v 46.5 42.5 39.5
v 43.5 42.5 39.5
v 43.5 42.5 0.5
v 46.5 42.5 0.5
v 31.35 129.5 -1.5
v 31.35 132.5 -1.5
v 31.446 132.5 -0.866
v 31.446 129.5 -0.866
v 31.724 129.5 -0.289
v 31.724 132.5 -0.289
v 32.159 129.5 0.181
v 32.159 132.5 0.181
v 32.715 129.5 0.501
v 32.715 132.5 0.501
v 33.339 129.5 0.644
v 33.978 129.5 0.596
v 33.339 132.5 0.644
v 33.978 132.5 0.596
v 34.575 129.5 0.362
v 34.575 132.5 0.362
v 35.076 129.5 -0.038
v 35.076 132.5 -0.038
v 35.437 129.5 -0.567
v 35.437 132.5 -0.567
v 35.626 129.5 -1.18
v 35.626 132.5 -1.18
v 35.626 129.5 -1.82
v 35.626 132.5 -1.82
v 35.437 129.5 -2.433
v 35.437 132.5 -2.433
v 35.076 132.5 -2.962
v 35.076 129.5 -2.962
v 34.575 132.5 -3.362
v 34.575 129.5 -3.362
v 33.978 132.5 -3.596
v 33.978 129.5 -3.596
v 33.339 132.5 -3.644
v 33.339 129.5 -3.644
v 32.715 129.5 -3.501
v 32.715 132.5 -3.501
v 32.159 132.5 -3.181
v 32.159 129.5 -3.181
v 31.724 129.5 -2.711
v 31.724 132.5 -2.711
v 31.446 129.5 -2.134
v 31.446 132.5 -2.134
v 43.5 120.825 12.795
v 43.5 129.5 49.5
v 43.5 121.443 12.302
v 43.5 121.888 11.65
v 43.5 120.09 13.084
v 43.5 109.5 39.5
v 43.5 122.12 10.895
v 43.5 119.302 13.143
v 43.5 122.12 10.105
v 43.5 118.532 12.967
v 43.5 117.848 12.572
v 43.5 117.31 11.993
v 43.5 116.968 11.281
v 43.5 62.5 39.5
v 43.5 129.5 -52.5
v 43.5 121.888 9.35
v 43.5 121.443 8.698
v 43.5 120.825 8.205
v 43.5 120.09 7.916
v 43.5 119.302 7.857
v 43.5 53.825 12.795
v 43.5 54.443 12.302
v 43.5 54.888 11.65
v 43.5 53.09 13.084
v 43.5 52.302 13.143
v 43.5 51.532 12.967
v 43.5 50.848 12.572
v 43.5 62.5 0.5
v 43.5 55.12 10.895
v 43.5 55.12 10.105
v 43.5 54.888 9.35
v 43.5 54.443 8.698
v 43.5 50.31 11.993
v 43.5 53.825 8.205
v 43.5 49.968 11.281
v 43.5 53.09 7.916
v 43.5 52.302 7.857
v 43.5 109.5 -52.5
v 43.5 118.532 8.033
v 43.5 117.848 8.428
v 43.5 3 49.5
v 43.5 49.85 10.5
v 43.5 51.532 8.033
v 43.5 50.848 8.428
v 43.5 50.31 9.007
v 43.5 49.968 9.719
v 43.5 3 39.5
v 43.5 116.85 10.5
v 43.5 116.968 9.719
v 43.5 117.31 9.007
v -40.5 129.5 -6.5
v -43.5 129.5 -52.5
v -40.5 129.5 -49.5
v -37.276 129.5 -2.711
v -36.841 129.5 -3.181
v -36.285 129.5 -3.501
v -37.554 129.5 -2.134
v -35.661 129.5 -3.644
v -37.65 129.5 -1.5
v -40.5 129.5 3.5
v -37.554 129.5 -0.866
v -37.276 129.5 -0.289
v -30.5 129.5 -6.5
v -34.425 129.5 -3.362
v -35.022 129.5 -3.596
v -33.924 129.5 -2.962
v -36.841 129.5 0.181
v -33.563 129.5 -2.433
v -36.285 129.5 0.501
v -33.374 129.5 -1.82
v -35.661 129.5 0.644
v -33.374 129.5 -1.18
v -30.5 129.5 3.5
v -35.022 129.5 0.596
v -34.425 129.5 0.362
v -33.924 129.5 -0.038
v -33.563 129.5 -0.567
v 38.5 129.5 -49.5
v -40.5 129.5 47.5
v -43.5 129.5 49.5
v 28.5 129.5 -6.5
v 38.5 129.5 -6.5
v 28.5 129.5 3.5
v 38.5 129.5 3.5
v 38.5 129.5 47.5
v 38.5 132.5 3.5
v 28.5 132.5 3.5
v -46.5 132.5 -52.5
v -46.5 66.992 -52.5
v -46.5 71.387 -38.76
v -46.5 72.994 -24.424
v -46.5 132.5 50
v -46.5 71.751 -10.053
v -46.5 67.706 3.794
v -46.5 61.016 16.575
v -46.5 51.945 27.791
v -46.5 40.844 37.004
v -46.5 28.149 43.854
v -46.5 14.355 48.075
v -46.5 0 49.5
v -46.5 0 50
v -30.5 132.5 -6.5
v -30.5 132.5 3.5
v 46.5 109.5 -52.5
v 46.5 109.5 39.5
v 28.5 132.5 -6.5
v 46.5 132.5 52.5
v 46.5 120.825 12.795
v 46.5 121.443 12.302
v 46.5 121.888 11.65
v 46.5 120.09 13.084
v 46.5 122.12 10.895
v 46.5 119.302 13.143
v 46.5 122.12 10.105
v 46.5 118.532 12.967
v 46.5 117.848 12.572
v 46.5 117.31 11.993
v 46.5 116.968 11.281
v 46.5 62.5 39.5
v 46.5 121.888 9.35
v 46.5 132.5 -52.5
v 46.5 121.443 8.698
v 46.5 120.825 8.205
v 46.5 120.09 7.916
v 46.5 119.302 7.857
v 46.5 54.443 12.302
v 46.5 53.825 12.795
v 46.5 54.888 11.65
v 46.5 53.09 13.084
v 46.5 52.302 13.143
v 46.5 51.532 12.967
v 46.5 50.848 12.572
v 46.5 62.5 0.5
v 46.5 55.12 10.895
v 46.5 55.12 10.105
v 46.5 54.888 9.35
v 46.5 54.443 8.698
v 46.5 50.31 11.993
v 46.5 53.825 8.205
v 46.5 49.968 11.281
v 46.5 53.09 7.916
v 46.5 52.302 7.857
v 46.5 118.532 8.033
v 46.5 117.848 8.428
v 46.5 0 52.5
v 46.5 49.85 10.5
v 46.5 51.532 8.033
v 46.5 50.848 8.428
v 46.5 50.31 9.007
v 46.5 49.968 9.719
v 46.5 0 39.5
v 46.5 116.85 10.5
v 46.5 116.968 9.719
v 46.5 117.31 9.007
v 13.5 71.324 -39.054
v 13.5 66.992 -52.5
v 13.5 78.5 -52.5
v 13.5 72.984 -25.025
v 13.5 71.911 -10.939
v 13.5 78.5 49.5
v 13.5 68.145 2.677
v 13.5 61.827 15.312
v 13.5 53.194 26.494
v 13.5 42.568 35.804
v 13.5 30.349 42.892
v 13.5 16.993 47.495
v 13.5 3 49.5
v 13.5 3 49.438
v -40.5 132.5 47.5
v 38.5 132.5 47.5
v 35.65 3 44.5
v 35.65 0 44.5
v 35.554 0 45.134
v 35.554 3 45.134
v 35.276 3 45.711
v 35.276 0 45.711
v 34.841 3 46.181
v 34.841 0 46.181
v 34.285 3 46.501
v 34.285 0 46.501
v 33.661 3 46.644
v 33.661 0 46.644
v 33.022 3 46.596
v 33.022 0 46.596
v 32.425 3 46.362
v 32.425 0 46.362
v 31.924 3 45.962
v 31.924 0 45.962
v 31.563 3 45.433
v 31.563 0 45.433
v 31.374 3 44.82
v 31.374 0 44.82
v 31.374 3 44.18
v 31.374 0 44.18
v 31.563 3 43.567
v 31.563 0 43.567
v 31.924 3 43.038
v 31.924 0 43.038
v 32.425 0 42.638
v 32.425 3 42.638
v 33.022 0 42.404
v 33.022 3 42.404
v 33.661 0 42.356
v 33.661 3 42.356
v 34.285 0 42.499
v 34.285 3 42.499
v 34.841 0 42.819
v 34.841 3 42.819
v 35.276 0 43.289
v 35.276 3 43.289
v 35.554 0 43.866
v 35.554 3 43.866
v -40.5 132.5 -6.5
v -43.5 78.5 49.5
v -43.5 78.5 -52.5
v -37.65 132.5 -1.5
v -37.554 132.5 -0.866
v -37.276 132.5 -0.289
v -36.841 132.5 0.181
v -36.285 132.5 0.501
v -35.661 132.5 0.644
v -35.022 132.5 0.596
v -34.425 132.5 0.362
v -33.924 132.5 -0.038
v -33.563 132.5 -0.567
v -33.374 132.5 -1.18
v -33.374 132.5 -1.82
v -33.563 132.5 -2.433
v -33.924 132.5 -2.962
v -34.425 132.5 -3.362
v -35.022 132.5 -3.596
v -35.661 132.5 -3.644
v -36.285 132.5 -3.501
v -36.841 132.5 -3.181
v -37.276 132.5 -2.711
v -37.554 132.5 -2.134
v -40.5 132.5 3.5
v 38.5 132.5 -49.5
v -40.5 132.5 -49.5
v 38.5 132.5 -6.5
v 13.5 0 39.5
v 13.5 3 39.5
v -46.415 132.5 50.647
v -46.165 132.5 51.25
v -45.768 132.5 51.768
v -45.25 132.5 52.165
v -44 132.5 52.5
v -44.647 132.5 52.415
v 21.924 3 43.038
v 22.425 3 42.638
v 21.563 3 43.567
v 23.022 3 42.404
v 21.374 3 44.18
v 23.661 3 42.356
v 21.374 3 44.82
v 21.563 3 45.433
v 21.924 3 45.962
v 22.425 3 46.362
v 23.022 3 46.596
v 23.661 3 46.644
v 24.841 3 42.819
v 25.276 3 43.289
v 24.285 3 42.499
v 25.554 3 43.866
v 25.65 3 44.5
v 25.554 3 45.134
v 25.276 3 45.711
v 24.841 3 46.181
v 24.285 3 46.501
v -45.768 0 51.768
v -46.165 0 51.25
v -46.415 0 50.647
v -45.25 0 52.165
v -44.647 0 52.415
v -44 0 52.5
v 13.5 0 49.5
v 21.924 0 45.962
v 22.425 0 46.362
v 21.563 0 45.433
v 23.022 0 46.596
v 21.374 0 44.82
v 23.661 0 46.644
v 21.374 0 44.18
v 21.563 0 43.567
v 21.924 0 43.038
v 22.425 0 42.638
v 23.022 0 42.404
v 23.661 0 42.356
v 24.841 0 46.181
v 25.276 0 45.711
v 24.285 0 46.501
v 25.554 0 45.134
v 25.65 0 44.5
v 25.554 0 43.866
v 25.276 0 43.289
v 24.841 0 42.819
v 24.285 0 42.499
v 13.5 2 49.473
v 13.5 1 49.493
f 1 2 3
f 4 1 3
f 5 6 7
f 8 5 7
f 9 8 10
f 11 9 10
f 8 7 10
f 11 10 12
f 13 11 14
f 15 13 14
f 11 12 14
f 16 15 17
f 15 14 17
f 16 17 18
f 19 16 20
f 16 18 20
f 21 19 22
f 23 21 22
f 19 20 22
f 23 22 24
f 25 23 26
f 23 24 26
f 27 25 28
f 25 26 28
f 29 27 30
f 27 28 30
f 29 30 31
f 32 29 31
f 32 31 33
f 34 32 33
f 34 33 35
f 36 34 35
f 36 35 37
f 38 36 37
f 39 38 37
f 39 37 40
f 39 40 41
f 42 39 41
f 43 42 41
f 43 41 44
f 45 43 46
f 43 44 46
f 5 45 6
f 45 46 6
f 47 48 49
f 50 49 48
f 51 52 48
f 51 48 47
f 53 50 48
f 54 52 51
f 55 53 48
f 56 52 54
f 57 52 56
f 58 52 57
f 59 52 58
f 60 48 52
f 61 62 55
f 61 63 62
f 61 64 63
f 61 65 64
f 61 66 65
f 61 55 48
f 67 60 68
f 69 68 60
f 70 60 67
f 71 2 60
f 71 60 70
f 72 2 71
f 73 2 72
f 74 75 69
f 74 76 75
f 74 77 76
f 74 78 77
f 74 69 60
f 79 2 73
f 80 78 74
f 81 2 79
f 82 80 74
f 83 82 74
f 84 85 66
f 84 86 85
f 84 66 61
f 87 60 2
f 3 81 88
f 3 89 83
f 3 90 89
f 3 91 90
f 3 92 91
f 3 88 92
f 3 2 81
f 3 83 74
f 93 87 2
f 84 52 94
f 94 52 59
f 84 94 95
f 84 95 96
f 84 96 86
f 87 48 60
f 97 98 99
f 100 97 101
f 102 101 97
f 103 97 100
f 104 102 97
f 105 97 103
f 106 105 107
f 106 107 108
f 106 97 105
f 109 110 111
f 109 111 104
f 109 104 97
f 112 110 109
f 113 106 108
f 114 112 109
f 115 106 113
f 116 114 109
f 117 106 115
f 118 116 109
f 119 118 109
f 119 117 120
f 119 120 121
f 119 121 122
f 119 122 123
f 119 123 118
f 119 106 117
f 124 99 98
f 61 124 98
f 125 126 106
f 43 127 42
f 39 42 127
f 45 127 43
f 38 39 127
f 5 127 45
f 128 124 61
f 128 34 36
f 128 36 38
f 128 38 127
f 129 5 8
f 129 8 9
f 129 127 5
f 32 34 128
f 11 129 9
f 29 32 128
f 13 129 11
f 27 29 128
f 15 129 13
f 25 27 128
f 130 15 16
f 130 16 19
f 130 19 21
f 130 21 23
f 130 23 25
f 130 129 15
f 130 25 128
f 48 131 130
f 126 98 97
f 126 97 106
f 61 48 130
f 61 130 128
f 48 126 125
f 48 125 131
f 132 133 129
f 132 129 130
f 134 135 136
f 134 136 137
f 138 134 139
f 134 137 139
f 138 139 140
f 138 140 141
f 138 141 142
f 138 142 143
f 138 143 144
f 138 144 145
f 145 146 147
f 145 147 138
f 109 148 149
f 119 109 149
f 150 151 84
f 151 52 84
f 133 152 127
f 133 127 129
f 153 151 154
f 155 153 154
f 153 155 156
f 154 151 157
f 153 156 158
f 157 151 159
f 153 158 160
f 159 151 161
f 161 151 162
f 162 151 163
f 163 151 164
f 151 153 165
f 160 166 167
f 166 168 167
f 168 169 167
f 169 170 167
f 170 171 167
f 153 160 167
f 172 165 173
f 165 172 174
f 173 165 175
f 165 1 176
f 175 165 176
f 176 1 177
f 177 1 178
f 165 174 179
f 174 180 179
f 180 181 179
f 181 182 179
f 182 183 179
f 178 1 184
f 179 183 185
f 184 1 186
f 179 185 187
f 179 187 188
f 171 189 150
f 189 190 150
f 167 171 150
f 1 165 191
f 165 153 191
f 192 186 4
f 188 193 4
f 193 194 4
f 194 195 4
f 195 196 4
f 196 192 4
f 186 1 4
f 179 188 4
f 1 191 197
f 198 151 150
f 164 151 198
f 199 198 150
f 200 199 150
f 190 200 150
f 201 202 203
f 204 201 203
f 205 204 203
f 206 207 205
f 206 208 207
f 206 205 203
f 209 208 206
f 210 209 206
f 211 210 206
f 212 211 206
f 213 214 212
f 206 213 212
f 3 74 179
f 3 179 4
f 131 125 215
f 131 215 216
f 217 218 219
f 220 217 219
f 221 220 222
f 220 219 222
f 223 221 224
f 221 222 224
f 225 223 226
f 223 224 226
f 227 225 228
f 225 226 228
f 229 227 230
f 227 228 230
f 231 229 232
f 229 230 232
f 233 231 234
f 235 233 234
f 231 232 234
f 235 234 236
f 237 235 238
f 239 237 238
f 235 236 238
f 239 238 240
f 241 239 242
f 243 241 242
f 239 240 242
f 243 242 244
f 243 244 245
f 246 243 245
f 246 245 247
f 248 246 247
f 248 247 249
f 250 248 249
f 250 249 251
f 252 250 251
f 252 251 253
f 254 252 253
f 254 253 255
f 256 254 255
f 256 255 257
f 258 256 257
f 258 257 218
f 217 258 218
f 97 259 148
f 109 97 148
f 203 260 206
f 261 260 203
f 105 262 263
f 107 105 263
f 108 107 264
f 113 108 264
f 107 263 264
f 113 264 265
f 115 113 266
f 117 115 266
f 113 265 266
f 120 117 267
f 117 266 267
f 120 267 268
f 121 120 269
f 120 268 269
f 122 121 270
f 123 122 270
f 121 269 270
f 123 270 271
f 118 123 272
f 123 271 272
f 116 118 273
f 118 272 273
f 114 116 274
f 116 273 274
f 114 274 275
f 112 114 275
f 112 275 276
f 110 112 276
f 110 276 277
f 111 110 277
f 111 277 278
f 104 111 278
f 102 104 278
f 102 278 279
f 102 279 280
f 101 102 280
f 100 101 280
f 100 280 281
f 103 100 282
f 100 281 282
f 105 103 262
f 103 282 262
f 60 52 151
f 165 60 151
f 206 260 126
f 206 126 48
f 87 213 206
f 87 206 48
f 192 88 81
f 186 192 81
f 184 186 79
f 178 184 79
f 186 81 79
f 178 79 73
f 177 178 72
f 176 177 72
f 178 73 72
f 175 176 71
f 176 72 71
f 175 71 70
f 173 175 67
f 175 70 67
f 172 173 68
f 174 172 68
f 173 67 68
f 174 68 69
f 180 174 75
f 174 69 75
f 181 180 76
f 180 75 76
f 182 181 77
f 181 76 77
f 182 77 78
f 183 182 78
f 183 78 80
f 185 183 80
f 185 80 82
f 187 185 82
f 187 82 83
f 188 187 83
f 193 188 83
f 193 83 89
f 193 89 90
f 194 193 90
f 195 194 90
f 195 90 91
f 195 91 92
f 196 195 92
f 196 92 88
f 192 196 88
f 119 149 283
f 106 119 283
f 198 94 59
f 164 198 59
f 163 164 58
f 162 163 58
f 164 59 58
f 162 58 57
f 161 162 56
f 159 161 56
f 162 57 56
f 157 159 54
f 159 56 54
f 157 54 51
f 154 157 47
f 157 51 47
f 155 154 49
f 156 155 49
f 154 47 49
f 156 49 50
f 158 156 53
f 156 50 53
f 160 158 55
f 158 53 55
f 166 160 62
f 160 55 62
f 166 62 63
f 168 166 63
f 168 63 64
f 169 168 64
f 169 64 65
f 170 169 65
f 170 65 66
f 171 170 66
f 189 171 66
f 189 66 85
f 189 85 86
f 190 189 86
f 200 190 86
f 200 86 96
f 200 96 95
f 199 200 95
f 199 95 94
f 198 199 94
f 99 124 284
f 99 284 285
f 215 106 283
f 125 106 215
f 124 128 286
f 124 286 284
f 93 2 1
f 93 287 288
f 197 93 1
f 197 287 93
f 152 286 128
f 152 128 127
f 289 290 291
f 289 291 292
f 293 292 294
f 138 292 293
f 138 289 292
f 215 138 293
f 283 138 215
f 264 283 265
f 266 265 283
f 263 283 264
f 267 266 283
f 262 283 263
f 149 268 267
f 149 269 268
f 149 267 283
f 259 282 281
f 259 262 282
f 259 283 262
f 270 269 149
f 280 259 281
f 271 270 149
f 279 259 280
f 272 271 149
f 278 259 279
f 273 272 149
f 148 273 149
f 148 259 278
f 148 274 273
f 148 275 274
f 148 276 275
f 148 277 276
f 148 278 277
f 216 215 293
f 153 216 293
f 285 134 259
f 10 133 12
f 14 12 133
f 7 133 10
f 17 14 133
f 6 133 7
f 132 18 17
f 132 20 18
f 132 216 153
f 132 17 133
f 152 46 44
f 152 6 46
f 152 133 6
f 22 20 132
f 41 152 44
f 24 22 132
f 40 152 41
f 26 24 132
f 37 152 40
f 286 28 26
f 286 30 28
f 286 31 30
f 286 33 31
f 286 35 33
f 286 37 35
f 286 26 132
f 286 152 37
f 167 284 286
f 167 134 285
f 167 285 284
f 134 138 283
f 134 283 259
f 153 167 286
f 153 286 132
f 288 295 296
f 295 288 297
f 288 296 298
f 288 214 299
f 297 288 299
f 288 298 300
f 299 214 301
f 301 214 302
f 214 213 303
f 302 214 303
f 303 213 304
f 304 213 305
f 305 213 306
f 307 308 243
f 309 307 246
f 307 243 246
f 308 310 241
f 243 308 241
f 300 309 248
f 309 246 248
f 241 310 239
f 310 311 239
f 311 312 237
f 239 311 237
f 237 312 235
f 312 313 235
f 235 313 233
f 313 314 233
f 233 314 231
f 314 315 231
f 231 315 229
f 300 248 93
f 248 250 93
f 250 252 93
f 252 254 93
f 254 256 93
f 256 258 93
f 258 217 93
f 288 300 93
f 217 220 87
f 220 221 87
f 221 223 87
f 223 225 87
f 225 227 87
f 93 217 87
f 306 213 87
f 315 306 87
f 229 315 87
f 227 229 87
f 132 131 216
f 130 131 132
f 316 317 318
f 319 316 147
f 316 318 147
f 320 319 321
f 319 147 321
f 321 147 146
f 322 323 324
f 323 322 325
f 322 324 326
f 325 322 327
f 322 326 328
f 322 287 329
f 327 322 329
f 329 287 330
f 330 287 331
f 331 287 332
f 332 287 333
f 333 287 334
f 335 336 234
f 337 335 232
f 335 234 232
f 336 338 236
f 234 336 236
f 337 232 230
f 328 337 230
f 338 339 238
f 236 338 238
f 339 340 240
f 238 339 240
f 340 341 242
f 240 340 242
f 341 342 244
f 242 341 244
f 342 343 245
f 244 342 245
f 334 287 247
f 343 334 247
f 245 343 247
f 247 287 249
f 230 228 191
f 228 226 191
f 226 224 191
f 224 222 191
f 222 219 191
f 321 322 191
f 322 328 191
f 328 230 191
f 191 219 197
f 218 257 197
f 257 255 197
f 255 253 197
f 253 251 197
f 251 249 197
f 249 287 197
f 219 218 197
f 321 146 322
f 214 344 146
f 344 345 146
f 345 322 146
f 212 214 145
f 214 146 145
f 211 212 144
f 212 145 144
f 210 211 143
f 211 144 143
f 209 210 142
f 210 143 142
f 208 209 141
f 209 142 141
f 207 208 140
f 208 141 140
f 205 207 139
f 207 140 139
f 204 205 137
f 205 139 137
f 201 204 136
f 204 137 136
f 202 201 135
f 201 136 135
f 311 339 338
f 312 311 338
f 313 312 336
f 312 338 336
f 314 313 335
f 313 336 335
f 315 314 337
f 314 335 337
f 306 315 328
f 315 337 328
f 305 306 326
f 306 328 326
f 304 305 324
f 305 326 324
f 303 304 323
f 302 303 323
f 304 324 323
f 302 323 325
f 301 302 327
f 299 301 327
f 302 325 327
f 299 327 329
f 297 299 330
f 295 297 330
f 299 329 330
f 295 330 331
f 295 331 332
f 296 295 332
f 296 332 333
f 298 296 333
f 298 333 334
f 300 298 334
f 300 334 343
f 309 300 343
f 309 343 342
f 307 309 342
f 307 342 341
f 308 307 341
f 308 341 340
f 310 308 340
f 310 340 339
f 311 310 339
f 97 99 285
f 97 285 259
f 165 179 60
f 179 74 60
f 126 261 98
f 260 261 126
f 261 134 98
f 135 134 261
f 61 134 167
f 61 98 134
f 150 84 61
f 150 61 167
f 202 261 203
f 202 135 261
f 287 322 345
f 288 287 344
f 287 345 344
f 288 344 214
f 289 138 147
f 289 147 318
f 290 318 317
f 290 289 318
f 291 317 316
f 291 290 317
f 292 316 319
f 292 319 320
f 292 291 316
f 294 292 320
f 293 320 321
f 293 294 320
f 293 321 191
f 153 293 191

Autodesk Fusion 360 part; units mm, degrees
sketch "스케치1" plane through (0, 0, 0) normal (0, 1, 0) x (1, 0, 0)
  line L0 (-46.5, -52.5) -> (46.5, -52.5)
  line L1 (46.5, -52.5) -> (46.5, 52.5)
  line L2 (46.5, 52.5) -> (-46.5, 52.5)
  line L3 (-46.5, 52.5) -> (-46.5, -52.5)
  line L4 (-46.5, -52.5) -> (46.5, 52.5) construction
  line L5 (46.5, -52.5) -> (-46.5, 52.5) construction
  line L6 (0, -52.5) -> (0, -47.5)
  line L7 (0, 52.5) -> (0, 49.5)
  line L8 (46.5, 0) -> (38.5, 0)
  line L9 (-46.5, 0) -> (-40.5, 0)
  line L10 (-40.5, 0) -> (-40.5, -47.5)
  line L11 (-40.5, -47.5) -> (38.5, -47.5)
  line L12 (38.5, -47.5) -> (38.5, 49.5)
  line L13 (38.5, 49.5) -> (-40.5, 49.5)
  line L14 (-40.5, 49.5) -> (-40.5, 0)
  dimension "d1" = 105
  dimension "d2" = 93
  dimension "d3" = 5
  dimension "d4" = 3
  dimension "d5" = 8
  dimension "d6" = 6
extrude "돌출1" add sketch "스케치1" along normal blind 132.5 contours L0 L3 L6 L9 L10 L11 | L0 L1 L6 L8 L11 L12 | L2 L3 L7 L9 L13 L14 | L1 L2 L7 L8 L12 L13
sketch "스케치2" plane through (0, 0, 0) normal (0, -1, 0) x (1, 0, 0)
  line L0 (-40.5, -49.5) -> (-40.5, 47.5)
  line L1 (-40.5, 47.5) -> (38.5, 47.5)
  line L2 (38.5, 47.5) -> (38.5, -49.5)
  line L3 (38.5, -49.5) -> (-40.5, -49.5)
  line L4 (-46.5, 52.5) -> (-46.5, -52.5)
  line L5 (-46.5, -52.5) -> (46.5, -52.5)
  line L6 (46.5, -52.5) -> (46.5, 52.5)
  line L7 (46.5, 52.5) -> (-46.5, 52.5)
  line L8 (-46.5, 52.5) -> (-43.5, 52.5)
  line L9 (-43.5, 52.5) -> (-43.5, 49.5)
  line L10 (-43.5, 49.5) -> (-46.5, 49.5)
  line L11 (-46.5, 49.5) -> (-46.5, 52.5)
  line L12 (46.5, -52.5) -> (43.5, -52.5)
  line L13 (-43.5, 49.5) -> (43.5, 49.5)
  line L14 (43.5, 49.5) -> (43.5, -52.5)
  line L15 (43.5, -52.5) -> (-43.5, -52.5)
  line L16 (-43.5, -52.5) -> (-43.5, 49.5)
  dimension "d9" = 3
  dimension "d10" = 3
  dimension "d11" = 3
extrude "돌출2" cut sketch "스케치2" against normal blind 129.5 contours L5 L13 L14 L15 L16
sketch "스케치3" plane through (-46.5, 0, 0) normal (-1, 0, 0) x (0, -1, 0)
  line L0 (0, -52.5) -> (0, 52.5)
  line L1 (0, 52.5) -> (-132.5, 52.5)
  line L2 (-132.5, 52.5) -> (-132.5, -52.5)
  line L3 (-132.5, -52.5) -> (0, -52.5)
  line L4 (0, 52.5) -> (0, -23.5)
  circle A0 centre (0, -23.5) radius 73
  circle A1 centre (0, -23.5) radius 75.5
  line L5 (0, 52.5) -> (-42.5, 52.5)
  line L6 (-42.5, 52.5) -> (-42.5, 35.8528)
  line L7 (-42.5, 35.8528) -> (0, 35.8528)
  line L8 (0, 35.8528) -> (0, 52.5)
  line L9 (0, 52.5) -> (-3, 52.5)
  line L10 (-3, 52.5) -> (-3, 49.4383)
  line L11 (-3, 49.4383) -> (0, 49.4383)
  line L12 (0, 49.4383) -> (0, 52.5)
  line L13 (-66.9925, -52.5) -> (-62.9352, -52.5)
  line L14 (-62.9352, -52.5) -> (-62.9352, -49.5)
  line L15 (-62.9352, -49.5) -> (-66.9925, -49.5)
  line L16 (-66.9925, -49.5) -> (-66.9925, -52.5)
  line L17 (0, 52.5) -> (-75.5, 52.5)
  line L18 (-75.5, 52.5) -> (-75.5, -52.5)
  line L19 (-75.5, -52.5) -> (0, -52.5)
  line L20 (0, -52.5) -> (0, 52.5)
  dimension "d14" = 76
  dimension "d15" = 146
  dimension "d16" = 151
  dimension "d45" = 42.5
  dimension "d46" = 3
  dimension "d50" = 3
  dimension "d71" = 75.5
extrude "돌출3" cut sketch "스케치3" against normal blind 10 contours L0 L3 L4 A0 L7 L14 L15 L16 L19 L20 | L3 L13 L14 L15 L16 L19 | L0 L4 A0 L7 L8 L11 L20 | L0 L4 A0 L8 L11 L12 L20
sketch "스케치4" plane through (0, 132.5, 0) normal (0, 1, 0) x (-1, 0, 0)
  line L0 (40.5, 47.5) -> (40.5, -49.5)
  line L1 (40.5, -49.5) -> (-38.5, -49.5)
  line L2 (-38.5, -49.5) -> (-38.5, 47.5)
  line L3 (-38.5, 47.5) -> (40.5, 47.5)
  line L4 (46.5, -52.5) -> (46.5, 52.5)
  line L5 (46.5, 52.5) -> (-46.5, 52.5)
  line L6 (-46.5, 52.5) -> (-46.5, -52.5)
  line L7 (-46.5, -52.5) -> (46.5, -52.5)
  line L8 (-38.5, -49.5) -> (-38.5, -6.5)
  line L9 (-38.5, -6.5) -> (-28.5, -6.5)
  line L10 (-28.5, -6.5) -> (-28.5, 3.5)
  line L11 (-28.5, 3.5) -> (-38.5, 3.5)
  line L12 (-38.5, 3.5) -> (-38.5, -6.5)
  line L13 (40.5, -6.5) -> (30.5, -6.5)
  line L14 (30.5, -6.5) -> (30.5, 3.5)
  line L15 (30.5, 3.5) -> (40.5, 3.5)
  line L16 (40.5, 3.5) -> (40.5, -6.5)
  circle A0 centre (-33.5, -1.5) radius 2.15
  circle A1 centre (35.5, -1.5) radius 2.15
  dimension "d19" = 43
  dimension "d20" = 10
  dimension "d21" = 10
  dimension "d22" = 10
  dimension "d23" = 10
  dimension "d24" = 4.3
  dimension "d25" = 4.3
extrude "돌출4" add sketch "스케치4" against normal blind 3 contours L0 L13 L14 L15 L16 | L2 L9 L10 L11 L12
sketch "스케치5" plane through (43.5, 0, 0) normal (-1, 0, 0) x (0, -1, 0)
  line L0 (0, -52.5) -> (0, 49.5)
  line L1 (0, 49.5) -> (-129.5, 49.5)
  line L2 (-129.5, 49.5) -> (-129.5, -52.5)
  line L3 (-129.5, -52.5) -> (0, -52.5)
  line L4 (-129.5, 49.5) -> (-109.5, 49.5)
  line L5 (-109.5, 49.5) -> (-109.5, -52.5)
  line L6 (-109.5, -52.5) -> (-129.5, -52.5)
  line L7 (-129.5, -52.5) -> (-129.5, 49.5)
  line L8 (-109.5, 49.5) -> (-62.5, 49.5)
  line L9 (-62.5, 49.5) -> (-42.5, 49.5)
  line L10 (-42.5, 49.5) -> (-42.5, -52.5)
  line L11 (-42.5, -52.5) -> (-62.5, -52.5)
  line L12 (-62.5, -52.5) -> (-62.5, 49.5)
  line L13 (-42.5, 49.5) -> (-42.5, 20.5)
  line L14 (-109.5, 20.5) -> (-129.5, 20.5)
  line L15 (-129.5, 20.5) -> (-129.5, 0.5)
  line L16 (-129.5, 0.5) -> (-109.5, 0.5)
  line L17 (-109.5, 0.5) -> (-109.5, 20.5)
  circle A0 centre (-119.5, 10.5) radius 2.65
  line L18 (-42.5, 20.5) -> (-62.5, 20.5)
  line L19 (-62.5, 20.5) -> (-62.5, 0.5)
  line L20 (-62.5, 0.5) -> (-42.5, 0.5)
  line L21 (-42.5, 0.5) -> (-42.5, 20.5)
  circle A1 centre (-52.5, 10.5) radius 2.65
  dimension "d28" = 20
  dimension "d29" = 47
  dimension "d30" = 20
  dimension "d31" = 29
  dimension "d33" = 20
  dimension "d34" = 20
  dimension "d36" = 5.3
  dimension "d41" = 20
  dimension "d42" = 5.3
extrude "돌출5" cut sketch "스케치5" against normal blind 3 contours L0 L1 L3 L10 L13 L21 | L3 L10 L11 L12 L20 | L1 L3 L5 L8 L12 L17 L19 | A0 | A1
extrude "돌출19" add sketch "스케치3" against normal blind 60 contours L3 A0 A1 L6 L19 | A0 A1 L6 L10 | L3 A1 L18 L19 | L0 L4 A0 A1 L8 L10 L12 L20 | L1 A1 L5 L6 L10 L17 | L1 A1 L6 L17 L18 | L0 L1 L4 A1 L5 L8 L9 L10 L12 L17 L20
extrude "돌출21" add 1 faces at (-24.5, 75.5, 15.5) along direction (0, 1, 0) blind 3
sketch "스케치12" plane through (0, 0, 49.5) normal (0, 0, -1) x (1, 0, 0)
  line L0 (13.5, -78.5) -> (-43.5, -78.5)
  line L1 (-43.5, -78.5) -> (-43.5, -129.5)
  line L2 (-43.5, -129.5) -> (43.5, -129.5)
  line L3 (43.5, -129.5) -> (43.5, -109.5)
  line L4 (43.5, -109.5) -> (46.5, -109.5)
  line L5 (46.5, -109.5) -> (46.5, -62.5)
  line L6 (46.5, -62.5) -> (43.5, -62.5)
  line L7 (43.5, -62.5) -> (43.5, -42.5)
  line L8 (43.5, -42.5) -> (46.5, -42.5)
  line L9 (46.5, -42.5) -> (46.5, 0)
  line L10 (46.5, 0) -> (13.5, 0)
  line L11 (13.5, 0) -> (13.5, -78.5)
  line L12 (46.5, 0) -> (13.5, 0)
  line L13 (13.5, 0) -> (13.5, -3)
  line L14 (13.5, -3) -> (46.5, -3)
  line L15 (46.5, -3) -> (46.5, 0)
  line L16 (43.5, -129.5) -> (46.5, -129.5)
  line L17 (46.5, -129.5) -> (46.5, 0)
  line L18 (46.5, 0) -> (43.5, 0)
  line L19 (43.5, 0) -> (43.5, -129.5)
  dimension "d103" = 3
extrude "돌출22" add sketch "스케치12" along normal blind 10 contours L10 L11 L12 L13 L14 L19 | L9 L10 L12 L14 L15 L17 L18 L19 | L8 L9 L14 L17 L19 | L4 L5 L6 L17 L19
sketch "스케치13" plane through (0, 0, 0) normal (0, -1, 0) x (1, 0, 0)
  line L0 (46.5, 39.5) -> (46.5, 52.5)
  line L1 (46.5, 52.5) -> (-46.5, 52.5)
  line L2 (-46.5, 52.5) -> (-46.5, 49.5)
  line L3 (-46.5, 49.5) -> (13.5, 49.5)
  line L4 (13.5, 49.5) -> (13.5, 39.5)
  line L5 (13.5, 39.5) -> (46.5, 39.5)
  line L6 (46.5, 52.5) -> (43.5, 52.5)
  line L7 (43.5, 52.5) -> (43.5, 39.5)
  line L8 (43.5, 39.5) -> (46.5, 39.5)
  line L9 (46.5, 39.5) -> (46.5, 52.5)
  line L10 (13.5, 39.5) -> (43.5, 39.5)
  line L11 (43.5, 39.5) -> (43.5, 49.5)
  line L12 (43.5, 49.5) -> (13.5, 49.5)
  line L13 (13.5, 49.5) -> (13.5, 39.5)
  line L14 (13.5, 44.5) -> (23.5, 44.5)
  line L15 (23.5, 44.5) -> (33.5, 44.5)
  circle A0 centre (23.5, 44.5) radius 2.15
  circle A1 centre (33.5, 44.5) radius 2.15
  dimension "d106" = 3
  dimension "d107" = 10
  dimension "d108" = 10
  dimension "d109" = 10
  dimension "d110" = 4.3
  dimension "d111" = 4.3
extrude "돌출23" cut sketch "스케치13" against normal blind 3 contours L14 L15 A0 | L14 L15 A0 | A1
fillet "필렛2" radius 2.5 1 edges at (-46.5, 66.25, 52.5)
